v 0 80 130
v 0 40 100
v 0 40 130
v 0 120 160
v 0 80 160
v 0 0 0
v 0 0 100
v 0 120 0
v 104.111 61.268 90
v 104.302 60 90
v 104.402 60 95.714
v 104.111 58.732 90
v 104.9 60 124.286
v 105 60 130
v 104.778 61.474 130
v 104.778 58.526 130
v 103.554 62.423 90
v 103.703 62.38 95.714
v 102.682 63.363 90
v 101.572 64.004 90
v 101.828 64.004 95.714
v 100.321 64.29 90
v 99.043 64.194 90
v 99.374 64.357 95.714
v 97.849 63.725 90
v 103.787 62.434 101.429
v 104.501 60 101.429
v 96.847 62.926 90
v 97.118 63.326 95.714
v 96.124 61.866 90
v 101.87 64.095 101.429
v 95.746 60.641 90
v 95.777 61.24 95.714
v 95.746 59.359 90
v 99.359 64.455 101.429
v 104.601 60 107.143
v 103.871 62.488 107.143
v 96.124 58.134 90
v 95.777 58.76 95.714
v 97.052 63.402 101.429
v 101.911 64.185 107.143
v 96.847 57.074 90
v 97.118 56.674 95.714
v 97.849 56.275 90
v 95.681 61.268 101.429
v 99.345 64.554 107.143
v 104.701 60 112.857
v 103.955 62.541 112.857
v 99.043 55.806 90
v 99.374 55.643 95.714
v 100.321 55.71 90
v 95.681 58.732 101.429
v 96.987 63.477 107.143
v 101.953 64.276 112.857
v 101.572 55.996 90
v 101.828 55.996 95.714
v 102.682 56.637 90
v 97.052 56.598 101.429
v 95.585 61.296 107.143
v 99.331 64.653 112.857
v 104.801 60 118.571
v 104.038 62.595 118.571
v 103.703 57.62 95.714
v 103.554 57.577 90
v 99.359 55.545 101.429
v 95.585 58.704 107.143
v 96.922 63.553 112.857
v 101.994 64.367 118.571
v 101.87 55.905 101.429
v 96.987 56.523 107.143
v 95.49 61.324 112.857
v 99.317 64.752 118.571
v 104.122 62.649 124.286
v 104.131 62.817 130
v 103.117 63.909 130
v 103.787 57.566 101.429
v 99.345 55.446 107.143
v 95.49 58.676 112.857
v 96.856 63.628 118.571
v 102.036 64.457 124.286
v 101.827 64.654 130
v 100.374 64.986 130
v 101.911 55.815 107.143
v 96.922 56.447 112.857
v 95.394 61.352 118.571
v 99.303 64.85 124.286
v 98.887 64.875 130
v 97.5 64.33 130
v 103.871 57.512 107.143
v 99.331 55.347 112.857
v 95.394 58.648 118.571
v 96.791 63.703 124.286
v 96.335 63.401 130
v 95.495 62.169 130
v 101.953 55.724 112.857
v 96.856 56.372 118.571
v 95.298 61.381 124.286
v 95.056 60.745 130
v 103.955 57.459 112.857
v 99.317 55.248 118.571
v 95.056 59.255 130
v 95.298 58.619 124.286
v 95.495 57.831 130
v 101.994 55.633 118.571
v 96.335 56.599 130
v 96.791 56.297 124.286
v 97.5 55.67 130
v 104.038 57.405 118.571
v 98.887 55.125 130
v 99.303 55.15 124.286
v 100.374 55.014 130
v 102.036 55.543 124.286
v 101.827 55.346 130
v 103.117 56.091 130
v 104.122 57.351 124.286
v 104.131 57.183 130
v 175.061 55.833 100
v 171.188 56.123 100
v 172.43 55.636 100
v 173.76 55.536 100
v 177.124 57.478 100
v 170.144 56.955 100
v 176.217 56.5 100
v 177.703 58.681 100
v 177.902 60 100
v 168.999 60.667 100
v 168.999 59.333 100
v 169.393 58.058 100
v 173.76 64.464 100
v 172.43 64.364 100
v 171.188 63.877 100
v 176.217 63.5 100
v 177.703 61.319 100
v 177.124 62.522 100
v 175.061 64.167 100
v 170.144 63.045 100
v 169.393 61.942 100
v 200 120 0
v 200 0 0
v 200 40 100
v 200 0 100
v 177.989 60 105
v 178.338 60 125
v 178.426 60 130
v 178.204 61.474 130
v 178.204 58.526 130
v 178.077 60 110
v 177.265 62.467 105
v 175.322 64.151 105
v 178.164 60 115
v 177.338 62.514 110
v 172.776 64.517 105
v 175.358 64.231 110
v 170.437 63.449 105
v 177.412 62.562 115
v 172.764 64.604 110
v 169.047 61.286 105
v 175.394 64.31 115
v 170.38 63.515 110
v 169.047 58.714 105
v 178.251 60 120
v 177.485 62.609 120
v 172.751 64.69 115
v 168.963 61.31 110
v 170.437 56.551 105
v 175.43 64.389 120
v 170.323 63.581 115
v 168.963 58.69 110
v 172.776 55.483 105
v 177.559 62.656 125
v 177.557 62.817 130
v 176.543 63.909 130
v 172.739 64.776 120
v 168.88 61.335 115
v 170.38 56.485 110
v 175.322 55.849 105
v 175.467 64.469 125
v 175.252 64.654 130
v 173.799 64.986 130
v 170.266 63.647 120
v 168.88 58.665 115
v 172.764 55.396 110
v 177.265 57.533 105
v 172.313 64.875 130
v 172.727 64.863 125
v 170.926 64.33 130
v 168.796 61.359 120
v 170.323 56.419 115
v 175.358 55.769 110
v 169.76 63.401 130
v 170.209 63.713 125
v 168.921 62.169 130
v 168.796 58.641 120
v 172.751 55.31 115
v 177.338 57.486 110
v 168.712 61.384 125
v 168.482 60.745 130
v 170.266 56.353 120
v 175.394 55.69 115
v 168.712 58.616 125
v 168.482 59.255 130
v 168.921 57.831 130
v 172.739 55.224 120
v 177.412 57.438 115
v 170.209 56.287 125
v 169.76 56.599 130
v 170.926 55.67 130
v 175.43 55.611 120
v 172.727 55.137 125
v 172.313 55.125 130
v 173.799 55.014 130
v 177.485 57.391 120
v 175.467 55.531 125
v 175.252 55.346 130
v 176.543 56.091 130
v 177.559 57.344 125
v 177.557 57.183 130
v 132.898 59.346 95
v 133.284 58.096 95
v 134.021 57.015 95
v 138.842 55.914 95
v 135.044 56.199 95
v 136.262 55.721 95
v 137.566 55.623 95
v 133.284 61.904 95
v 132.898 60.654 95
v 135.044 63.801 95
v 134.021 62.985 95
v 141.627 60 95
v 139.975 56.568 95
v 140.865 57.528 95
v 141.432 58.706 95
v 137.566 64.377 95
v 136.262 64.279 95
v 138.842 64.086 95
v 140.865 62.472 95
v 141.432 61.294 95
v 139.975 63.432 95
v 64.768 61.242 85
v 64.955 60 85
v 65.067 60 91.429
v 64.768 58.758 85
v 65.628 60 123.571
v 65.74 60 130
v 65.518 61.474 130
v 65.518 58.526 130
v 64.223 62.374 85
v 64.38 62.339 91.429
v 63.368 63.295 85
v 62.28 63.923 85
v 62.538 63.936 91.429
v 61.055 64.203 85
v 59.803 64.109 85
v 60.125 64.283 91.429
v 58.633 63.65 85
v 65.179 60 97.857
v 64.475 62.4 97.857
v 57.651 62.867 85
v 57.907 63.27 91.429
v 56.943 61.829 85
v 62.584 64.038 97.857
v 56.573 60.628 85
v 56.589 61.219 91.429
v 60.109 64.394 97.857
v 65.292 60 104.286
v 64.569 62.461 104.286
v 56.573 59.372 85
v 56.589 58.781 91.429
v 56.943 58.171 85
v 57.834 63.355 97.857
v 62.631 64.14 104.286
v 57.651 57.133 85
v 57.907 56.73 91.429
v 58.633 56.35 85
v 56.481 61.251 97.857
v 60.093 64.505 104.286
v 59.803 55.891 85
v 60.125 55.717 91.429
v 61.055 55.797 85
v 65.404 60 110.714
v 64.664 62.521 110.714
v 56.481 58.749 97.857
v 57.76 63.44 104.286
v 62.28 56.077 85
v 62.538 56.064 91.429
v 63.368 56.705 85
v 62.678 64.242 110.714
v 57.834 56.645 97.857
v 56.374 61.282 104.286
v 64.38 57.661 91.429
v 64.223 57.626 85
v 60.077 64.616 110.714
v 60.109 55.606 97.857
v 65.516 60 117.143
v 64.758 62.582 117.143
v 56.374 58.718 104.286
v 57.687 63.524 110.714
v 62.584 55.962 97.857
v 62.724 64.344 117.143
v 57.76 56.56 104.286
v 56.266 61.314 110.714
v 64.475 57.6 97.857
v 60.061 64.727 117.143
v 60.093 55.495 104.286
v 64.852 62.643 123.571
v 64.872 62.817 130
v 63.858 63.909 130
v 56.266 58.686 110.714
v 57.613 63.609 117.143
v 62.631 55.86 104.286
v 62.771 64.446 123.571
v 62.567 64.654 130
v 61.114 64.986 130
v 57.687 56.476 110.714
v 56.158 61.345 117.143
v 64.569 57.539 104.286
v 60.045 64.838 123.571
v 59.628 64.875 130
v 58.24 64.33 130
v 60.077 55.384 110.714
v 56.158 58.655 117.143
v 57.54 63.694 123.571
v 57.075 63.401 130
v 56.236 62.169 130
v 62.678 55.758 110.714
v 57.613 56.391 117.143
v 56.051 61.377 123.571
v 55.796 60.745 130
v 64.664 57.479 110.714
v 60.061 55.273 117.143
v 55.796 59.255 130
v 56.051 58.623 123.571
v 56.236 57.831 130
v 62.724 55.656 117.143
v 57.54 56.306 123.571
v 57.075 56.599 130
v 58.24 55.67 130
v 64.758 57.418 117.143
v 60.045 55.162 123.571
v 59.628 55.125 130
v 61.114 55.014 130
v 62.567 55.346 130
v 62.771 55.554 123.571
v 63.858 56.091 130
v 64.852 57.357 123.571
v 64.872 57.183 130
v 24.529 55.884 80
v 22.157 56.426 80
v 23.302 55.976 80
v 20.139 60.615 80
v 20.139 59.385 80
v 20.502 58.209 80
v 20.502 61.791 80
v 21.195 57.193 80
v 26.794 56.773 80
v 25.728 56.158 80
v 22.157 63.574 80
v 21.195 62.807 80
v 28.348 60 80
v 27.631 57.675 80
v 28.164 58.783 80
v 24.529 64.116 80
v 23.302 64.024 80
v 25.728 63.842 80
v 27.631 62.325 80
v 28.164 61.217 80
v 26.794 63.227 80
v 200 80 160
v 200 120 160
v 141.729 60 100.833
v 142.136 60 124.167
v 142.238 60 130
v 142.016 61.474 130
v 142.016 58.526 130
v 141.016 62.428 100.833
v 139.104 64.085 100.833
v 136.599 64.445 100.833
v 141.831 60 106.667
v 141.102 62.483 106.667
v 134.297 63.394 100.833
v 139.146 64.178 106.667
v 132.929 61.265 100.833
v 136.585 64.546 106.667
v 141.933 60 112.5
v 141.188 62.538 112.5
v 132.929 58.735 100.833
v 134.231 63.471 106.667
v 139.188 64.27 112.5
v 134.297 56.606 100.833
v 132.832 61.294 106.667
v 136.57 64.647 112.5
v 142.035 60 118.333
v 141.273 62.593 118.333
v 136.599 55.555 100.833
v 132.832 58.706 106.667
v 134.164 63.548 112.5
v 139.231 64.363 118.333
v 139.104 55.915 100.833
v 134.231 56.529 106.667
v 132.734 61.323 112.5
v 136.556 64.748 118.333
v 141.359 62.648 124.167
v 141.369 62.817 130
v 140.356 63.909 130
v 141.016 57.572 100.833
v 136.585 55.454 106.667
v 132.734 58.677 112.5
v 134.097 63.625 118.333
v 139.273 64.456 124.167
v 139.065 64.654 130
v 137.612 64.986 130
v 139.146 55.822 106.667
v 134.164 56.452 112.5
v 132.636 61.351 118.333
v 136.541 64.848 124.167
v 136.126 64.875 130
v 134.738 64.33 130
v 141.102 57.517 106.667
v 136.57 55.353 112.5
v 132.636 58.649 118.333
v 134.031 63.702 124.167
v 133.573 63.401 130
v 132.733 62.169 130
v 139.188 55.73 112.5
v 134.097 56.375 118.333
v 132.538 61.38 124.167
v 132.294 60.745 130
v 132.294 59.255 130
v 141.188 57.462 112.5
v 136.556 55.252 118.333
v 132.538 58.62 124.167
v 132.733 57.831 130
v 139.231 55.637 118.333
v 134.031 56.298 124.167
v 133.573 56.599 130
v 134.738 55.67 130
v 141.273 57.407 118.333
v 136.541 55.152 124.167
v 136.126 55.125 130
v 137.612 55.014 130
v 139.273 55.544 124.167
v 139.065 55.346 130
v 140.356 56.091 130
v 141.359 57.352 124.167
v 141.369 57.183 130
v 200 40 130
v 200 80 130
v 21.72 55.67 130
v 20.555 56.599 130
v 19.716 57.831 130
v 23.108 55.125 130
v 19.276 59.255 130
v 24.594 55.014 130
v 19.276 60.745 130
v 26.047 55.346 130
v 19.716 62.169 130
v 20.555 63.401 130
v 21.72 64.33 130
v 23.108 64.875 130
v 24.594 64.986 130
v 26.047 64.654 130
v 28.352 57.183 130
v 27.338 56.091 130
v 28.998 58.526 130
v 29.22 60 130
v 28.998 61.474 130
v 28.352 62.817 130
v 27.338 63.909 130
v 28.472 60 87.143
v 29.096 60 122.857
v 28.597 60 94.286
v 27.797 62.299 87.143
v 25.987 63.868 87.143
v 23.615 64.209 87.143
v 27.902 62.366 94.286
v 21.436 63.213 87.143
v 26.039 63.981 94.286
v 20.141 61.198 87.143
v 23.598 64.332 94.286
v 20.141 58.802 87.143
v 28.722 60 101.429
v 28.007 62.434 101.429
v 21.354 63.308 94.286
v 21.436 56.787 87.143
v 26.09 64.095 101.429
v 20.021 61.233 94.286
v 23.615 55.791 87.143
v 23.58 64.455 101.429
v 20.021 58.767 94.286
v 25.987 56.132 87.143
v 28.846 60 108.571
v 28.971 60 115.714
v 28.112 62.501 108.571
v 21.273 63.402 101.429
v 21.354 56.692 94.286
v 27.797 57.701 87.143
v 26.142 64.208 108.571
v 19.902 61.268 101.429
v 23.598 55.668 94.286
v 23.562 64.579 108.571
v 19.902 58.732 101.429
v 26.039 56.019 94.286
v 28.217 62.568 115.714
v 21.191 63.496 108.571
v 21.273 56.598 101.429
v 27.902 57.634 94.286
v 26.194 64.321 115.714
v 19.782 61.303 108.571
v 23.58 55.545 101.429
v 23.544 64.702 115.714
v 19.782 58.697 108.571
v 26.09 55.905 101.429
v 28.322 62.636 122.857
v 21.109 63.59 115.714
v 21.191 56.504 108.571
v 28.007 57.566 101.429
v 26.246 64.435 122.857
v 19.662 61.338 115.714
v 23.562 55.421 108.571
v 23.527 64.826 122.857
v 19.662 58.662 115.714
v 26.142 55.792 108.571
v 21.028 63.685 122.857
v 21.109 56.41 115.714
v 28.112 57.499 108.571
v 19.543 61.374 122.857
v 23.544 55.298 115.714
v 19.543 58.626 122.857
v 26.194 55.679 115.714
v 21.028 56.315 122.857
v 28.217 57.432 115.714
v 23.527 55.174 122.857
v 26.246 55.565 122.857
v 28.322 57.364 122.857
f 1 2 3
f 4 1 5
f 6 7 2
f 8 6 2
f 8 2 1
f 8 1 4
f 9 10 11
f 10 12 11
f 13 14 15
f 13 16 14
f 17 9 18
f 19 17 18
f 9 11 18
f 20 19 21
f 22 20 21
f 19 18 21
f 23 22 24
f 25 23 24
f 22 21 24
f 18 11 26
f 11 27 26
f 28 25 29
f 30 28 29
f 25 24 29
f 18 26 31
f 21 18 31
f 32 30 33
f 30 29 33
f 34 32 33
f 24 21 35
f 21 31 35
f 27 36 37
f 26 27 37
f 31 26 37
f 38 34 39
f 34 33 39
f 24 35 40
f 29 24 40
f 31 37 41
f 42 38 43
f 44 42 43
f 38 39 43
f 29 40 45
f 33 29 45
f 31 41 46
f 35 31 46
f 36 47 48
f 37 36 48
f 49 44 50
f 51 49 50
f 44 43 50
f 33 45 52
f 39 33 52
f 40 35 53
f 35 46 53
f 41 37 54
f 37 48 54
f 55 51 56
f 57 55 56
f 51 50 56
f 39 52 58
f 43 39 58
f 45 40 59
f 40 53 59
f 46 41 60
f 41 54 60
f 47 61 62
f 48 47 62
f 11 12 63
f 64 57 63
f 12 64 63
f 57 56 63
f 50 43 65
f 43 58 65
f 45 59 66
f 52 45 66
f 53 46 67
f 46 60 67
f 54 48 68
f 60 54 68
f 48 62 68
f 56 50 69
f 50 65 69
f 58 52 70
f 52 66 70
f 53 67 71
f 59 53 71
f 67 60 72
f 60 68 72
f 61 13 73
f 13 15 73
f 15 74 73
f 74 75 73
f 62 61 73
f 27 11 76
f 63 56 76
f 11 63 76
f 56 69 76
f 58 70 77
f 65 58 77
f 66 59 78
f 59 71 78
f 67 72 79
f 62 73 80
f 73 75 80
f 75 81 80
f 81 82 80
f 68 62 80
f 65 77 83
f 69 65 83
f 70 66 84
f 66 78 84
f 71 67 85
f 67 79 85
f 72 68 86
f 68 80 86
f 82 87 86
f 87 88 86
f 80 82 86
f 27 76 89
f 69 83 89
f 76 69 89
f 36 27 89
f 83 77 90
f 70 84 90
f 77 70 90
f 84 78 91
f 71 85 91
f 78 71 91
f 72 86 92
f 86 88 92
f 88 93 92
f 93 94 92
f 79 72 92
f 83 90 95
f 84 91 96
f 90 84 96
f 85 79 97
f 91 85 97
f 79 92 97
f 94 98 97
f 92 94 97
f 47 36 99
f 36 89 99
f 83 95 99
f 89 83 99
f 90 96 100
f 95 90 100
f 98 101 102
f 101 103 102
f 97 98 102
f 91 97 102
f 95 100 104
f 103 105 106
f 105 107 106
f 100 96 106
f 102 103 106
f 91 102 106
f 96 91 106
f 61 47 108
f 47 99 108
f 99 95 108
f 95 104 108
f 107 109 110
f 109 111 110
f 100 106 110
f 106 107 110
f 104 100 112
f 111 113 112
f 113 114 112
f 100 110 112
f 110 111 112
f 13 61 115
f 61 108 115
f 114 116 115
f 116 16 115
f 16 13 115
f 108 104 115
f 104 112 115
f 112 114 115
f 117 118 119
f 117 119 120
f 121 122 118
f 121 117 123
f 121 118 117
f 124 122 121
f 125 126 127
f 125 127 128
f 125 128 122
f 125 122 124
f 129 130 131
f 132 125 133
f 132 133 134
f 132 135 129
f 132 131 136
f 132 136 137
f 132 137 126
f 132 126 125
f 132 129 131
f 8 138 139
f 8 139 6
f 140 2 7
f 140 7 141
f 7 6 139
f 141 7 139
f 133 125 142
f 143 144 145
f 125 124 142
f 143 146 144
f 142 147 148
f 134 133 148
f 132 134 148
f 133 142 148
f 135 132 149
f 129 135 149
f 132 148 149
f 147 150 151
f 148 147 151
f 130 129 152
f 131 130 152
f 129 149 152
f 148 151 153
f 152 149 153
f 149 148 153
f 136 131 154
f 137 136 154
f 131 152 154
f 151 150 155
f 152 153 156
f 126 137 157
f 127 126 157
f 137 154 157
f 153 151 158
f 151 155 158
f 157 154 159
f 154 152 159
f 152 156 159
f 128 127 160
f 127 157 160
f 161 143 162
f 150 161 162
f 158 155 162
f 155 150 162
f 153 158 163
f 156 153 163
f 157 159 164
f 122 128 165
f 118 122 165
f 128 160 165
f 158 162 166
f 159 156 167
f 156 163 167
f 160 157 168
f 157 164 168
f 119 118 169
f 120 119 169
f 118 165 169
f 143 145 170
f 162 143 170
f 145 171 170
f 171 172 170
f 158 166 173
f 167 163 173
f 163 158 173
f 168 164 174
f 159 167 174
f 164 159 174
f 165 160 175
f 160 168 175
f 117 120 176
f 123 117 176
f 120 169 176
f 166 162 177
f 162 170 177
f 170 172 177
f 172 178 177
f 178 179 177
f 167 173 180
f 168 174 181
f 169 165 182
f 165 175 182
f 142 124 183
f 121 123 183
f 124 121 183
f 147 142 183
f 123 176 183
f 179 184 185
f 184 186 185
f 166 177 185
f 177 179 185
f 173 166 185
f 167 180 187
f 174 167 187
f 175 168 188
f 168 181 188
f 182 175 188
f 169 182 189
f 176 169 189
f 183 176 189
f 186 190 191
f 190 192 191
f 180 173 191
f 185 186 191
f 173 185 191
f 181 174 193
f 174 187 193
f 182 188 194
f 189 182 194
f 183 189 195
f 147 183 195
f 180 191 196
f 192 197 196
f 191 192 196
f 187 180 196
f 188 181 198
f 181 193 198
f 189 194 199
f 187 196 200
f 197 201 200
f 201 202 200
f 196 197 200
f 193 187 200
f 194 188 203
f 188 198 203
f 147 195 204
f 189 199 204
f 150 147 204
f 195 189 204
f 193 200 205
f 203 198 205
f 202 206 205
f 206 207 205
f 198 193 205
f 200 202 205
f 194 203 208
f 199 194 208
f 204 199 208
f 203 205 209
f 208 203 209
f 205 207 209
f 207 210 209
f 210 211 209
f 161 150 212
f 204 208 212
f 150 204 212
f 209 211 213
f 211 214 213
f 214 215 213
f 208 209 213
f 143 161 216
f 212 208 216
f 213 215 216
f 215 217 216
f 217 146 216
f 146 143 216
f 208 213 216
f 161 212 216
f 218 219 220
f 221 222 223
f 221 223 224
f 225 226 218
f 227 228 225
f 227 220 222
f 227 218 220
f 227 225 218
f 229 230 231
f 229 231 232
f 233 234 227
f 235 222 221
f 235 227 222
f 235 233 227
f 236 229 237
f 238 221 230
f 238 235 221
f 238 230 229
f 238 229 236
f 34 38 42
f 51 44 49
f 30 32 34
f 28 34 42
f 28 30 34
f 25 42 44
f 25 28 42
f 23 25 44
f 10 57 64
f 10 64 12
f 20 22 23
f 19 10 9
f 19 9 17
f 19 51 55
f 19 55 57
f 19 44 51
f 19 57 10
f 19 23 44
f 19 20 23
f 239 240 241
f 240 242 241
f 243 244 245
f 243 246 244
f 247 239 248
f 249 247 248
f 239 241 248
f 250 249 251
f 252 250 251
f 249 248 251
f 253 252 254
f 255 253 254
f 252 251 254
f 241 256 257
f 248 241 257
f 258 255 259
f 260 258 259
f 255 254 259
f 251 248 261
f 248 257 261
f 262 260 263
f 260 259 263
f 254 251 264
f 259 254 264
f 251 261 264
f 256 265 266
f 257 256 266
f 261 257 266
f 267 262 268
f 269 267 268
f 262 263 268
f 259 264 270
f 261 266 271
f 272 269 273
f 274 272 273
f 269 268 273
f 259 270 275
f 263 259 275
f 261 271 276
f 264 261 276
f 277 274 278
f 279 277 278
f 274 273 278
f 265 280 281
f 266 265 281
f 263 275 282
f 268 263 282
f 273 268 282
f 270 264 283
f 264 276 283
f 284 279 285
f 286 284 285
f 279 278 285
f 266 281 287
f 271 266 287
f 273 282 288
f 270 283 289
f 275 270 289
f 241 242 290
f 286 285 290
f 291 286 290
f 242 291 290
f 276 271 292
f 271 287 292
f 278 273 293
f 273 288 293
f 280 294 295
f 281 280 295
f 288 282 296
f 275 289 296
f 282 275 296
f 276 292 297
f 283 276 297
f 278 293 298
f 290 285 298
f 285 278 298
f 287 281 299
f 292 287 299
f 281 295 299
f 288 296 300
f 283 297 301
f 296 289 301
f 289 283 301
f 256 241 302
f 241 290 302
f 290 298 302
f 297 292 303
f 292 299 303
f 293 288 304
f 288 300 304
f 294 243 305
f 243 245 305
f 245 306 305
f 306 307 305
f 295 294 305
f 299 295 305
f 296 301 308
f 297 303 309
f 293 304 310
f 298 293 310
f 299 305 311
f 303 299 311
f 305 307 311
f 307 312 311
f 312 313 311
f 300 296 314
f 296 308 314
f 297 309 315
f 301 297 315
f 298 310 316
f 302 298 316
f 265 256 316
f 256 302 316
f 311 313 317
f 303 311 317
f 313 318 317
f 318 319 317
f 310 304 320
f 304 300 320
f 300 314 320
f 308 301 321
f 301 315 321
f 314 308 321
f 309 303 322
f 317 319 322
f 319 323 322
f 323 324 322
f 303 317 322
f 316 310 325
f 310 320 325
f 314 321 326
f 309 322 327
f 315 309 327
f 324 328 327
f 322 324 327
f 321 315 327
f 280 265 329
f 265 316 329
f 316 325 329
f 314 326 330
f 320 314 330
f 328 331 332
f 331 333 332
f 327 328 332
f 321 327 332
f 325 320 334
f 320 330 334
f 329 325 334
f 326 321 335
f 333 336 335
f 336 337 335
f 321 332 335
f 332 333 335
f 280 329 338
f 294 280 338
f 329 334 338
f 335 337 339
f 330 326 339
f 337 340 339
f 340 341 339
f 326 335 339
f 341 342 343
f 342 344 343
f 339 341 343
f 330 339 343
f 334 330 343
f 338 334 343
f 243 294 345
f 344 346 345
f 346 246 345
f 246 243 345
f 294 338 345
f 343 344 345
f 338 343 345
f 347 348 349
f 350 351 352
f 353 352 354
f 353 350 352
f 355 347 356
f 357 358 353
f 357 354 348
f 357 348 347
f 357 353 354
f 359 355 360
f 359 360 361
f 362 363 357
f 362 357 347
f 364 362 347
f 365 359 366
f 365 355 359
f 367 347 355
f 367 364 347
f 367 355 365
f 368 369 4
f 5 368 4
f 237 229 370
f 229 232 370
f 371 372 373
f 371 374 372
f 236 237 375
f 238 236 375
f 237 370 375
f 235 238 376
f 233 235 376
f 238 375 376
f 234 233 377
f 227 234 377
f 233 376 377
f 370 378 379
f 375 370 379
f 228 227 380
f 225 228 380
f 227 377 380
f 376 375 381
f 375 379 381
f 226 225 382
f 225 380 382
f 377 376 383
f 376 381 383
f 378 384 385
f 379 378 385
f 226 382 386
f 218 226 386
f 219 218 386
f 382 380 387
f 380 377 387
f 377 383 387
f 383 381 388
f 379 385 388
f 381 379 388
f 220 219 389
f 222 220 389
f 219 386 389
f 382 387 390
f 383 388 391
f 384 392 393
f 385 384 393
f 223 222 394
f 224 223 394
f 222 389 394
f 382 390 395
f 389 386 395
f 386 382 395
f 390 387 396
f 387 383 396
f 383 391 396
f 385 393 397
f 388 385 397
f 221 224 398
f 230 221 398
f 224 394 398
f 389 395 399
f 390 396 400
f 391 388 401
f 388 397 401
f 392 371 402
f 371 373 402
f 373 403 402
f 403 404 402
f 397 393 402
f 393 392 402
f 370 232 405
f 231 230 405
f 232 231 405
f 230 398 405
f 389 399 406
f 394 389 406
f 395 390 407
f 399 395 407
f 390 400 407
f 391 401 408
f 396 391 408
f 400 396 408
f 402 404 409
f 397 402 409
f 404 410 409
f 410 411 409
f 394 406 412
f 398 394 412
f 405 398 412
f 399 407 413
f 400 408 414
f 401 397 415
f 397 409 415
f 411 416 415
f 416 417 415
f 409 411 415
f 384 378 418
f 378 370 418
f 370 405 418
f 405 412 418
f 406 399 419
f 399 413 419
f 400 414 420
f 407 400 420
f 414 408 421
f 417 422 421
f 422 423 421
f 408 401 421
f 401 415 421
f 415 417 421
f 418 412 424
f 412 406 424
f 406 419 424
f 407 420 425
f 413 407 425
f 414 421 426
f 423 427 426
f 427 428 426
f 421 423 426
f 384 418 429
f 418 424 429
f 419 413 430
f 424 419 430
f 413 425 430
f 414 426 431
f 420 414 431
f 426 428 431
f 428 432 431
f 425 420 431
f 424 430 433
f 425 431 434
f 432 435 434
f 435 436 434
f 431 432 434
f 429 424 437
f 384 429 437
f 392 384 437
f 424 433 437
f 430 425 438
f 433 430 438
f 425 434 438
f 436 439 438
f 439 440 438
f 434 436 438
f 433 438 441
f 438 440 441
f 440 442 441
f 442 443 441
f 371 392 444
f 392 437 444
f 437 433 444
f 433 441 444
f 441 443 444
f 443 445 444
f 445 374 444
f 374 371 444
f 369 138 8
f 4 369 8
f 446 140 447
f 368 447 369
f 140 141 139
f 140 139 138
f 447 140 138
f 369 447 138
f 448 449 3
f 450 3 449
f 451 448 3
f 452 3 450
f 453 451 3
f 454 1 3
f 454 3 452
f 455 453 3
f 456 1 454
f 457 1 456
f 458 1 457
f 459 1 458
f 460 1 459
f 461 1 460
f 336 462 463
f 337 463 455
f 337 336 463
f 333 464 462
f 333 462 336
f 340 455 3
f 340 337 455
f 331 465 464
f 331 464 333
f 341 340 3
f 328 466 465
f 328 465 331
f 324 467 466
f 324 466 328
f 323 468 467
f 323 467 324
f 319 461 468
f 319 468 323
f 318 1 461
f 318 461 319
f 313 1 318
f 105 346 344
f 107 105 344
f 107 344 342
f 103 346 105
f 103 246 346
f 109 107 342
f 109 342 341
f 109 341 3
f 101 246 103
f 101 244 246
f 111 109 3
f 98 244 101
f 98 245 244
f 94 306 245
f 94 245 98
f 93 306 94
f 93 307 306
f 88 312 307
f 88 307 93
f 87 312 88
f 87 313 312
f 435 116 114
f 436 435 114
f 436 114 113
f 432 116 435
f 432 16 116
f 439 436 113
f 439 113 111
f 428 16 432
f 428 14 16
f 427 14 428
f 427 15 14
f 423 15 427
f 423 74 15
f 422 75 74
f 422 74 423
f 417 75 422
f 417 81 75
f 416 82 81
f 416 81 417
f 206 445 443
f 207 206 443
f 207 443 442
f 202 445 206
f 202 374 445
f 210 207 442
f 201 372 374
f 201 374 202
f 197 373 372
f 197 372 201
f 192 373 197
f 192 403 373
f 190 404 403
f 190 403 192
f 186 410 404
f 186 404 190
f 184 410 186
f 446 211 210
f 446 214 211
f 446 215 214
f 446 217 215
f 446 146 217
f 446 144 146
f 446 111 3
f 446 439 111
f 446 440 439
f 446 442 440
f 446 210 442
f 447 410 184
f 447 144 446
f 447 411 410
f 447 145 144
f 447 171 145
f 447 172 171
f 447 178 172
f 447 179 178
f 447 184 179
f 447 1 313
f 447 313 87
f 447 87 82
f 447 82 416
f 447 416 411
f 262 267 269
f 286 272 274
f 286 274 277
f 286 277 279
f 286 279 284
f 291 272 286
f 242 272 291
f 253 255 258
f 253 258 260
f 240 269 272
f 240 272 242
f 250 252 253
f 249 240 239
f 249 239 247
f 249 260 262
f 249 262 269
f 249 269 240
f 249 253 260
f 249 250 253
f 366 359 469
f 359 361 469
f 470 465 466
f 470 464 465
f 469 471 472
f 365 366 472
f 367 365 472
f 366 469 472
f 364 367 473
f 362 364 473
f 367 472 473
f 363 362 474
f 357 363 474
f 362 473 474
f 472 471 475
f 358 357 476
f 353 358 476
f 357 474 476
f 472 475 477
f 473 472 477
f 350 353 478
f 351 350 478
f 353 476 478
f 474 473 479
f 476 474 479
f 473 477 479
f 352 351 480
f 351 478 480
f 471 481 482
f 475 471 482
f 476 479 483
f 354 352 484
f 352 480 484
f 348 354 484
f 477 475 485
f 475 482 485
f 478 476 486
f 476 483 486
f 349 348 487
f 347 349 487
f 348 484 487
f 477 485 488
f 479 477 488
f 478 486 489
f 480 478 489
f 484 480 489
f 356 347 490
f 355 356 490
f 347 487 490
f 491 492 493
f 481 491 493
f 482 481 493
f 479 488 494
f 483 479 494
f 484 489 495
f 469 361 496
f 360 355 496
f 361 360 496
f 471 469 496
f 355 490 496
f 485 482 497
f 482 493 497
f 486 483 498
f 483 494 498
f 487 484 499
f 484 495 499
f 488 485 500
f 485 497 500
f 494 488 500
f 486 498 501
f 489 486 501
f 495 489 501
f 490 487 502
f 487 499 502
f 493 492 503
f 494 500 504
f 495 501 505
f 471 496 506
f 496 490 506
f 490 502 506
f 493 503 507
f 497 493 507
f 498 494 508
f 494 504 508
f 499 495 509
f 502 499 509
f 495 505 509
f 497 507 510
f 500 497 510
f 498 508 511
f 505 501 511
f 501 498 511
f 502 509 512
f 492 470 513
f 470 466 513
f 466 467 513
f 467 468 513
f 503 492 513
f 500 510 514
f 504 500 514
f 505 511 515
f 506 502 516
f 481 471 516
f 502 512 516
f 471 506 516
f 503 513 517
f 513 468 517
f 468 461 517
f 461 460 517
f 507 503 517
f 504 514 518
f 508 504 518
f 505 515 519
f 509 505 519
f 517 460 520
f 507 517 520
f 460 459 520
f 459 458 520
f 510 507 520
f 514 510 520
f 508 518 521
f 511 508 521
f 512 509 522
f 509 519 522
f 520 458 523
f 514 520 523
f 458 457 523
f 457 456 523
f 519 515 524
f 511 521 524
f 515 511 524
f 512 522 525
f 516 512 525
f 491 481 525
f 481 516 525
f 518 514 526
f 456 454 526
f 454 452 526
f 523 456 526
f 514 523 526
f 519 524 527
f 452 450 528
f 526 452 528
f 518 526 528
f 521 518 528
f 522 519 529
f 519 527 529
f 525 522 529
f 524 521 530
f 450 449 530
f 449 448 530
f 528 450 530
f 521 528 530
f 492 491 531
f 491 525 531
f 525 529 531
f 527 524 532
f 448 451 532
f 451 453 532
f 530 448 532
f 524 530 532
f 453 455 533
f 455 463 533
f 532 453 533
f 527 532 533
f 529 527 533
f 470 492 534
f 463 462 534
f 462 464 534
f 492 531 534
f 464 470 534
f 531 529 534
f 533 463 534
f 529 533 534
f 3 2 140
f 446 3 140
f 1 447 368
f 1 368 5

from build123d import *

# Parameters (mm, degrees)
SKETCH_1_W           = 200
SKETCH_1_H           = 40
EXTRUDE_1_DEPTH      = 100
SKETCH_1_3_W         = 200
SKETCH_1_3_H         = 40
EXTRUDE_2_DEPTH      = 130
SKETCH_10_W          = 200
SKETCH_10_H          = 40
EXTRUDE_3_DEPTH      = 160
SKETCH_12_R          = 5
CUT_EXTRUDE_8_DEPTH  = 50
CUT_EXTRUDE_8_DRAFT  = -1
SKETCH_12_5_R        = 5
CUT_EXTRUDE_9_DEPTH  = 45
CUT_EXTRUDE_9_DRAFT  = -1
SKETCH_12_6_R        = 5
CUT_EXTRUDE_10_DEPTH = 40
CUT_EXTRUDE_10_DRAFT = -1
SKETCH_12_7_R        = 5
CUT_EXTRUDE_11_DEPTH = 35
CUT_EXTRUDE_11_DRAFT = -1
SKETCH_12_8_R        = 5
CUT_EXTRUDE_12_DEPTH = 30
CUT_EXTRUDE_12_DRAFT = -1


with BuildPart() as part:
    # Эскиз1 → Бобышка-Вытянуть1 (new body)
    with BuildSketch(Plane.XY):
        with Locations((100, 20)):
            Rectangle(SKETCH_1_W, SKETCH_1_H)
    extrude(amount=EXTRUDE_1_DEPTH)

    # Эскиз1<3> → Бобышка-Вытянуть2 (add)
    with BuildSketch(Plane.XY):
        with Locations((100, 60)):
            Rectangle(SKETCH_1_3_W, SKETCH_1_3_H)
    extrude(amount=EXTRUDE_2_DEPTH)

    # Эскиз10 → Бобышка-Вытянуть3 (add)
    with BuildSketch(Plane(origin=(0, 0, 0), x_dir=(-1, 0, 0), z_dir=(0, 0, -1))):
        with Locations((-100, 100)):
            Rectangle(SKETCH_10_W, SKETCH_10_H)
    extrude(amount=-EXTRUDE_3_DEPTH)


with BuildPart() as cut_extrude_8_tool:
    # Эскиз12 → Вырез-Вытянуть8 (with draft: the straight prism first)
    with BuildSketch(Plane.XY.offset(130)):
        with Locations((24.220497744, 60)):
            Circle(SKETCH_12_R)
    extrude(amount=-CUT_EXTRUDE_8_DEPTH)
    # Вырез-Вытянуть8: the draft: its side faces are tilted about the plane it starts from
    cut_extrude_8_sides = [cut_extrude_8_tool.faces().sort_by_distance(p)[0] for p in [
        (19.220497744, 60, 105),
    ]]
    draft(cut_extrude_8_sides, Plane.XY.offset(130), CUT_EXTRUDE_8_DRAFT)


with BuildPart() as part_1:
    add(part.part)

    # Вырез-Вытянуть8: cut by cut_extrude_8_tool
    add(cut_extrude_8_tool.part, mode=Mode.SUBTRACT)


with BuildPart() as cut_extrude_9_tool:
    # Эскиз12<5> → Вырез-Вытянуть9 (with draft: the straight prism first)
    with BuildSketch(Plane.XY.offset(130)):
        with Locations((60.740492413, 60)):
            Circle(SKETCH_12_5_R)
    extrude(amount=-CUT_EXTRUDE_9_DEPTH)
    # Вырез-Вытянуть9: the draft: its side faces are tilted about the plane it starts from
    cut_extrude_9_sides = [cut_extrude_9_tool.faces().sort_by_distance(p)[0] for p in [
        (55.740492413, 60, 107.5),
    ]]
    draft(cut_extrude_9_sides, Plane.XY.offset(130), CUT_EXTRUDE_9_DRAFT)


with BuildPart() as part_2:
    add(part_1.part)

    # Вырез-Вытянуть9: cut by cut_extrude_9_tool
    add(cut_extrude_9_tool.part, mode=Mode.SUBTRACT)


with BuildPart() as cut_extrude_10_tool:
    # Эскиз12<6> → Вырез-Вытянуть10 (with draft: the straight prism first)
    with BuildSketch(Plane.XY.offset(130)):
        with Locations((100, 60)):
            Circle(SKETCH_12_6_R)
    extrude(amount=-CUT_EXTRUDE_10_DEPTH)
    # Вырез-Вытянуть10: the draft: its side faces are tilted about the plane it starts from
    cut_extrude_10_sides = [cut_extrude_10_tool.faces().sort_by_distance(p)[0] for p in [
        (95, 60, 110),
    ]]
    draft(cut_extrude_10_sides, Plane.XY.offset(130), CUT_EXTRUDE_10_DRAFT)


with BuildPart() as part_3:
    add(part_2.part)

    # Вырез-Вытянуть10: cut by cut_extrude_10_tool
    add(cut_extrude_10_tool.part, mode=Mode.SUBTRACT)


with BuildPart() as cut_extrude_11_tool:
    # Эскиз12<7> → Вырез-Вытянуть11 (with draft: the straight prism first)
    with BuildSketch(Plane.XY.offset(130)):
        with Locations((137.238261218, 60)):
            Circle(SKETCH_12_7_R)
    extrude(amount=-CUT_EXTRUDE_11_DEPTH)
    # Вырез-Вытянуть11: the draft: its side faces are tilted about the plane it starts from
    cut_extrude_11_sides = [cut_extrude_11_tool.faces().sort_by_distance(p)[0] for p in [
        (132.238261218, 60, 112.5),
    ]]
    draft(cut_extrude_11_sides, Plane.XY.offset(130), CUT_EXTRUDE_11_DRAFT)


with BuildPart() as part_4:
    add(part_3.part)

    # Вырез-Вытянуть11: cut by cut_extrude_11_tool
    add(cut_extrude_11_tool.part, mode=Mode.SUBTRACT)


with BuildPart() as cut_extrude_12_tool:
    # Эскиз12<8> → Вырез-Вытянуть12 (with draft: the straight prism first)
    with BuildSketch(Plane.XY.offset(130)):
        with Locations((173.42575674, 60)):
            Circle(SKETCH_12_8_R)
    extrude(amount=-CUT_EXTRUDE_12_DEPTH)
    # Вырез-Вытянуть12: the draft: its side faces are tilted about the plane it starts from
    cut_extrude_12_sides = [cut_extrude_12_tool.faces().sort_by_distance(p)[0] for p in [
        (168.42575674, 60, 115),
    ]]
    draft(cut_extrude_12_sides, Plane.XY.offset(130), CUT_EXTRUDE_12_DRAFT)


with BuildPart() as part_5:
    add(part_4.part)

    # Вырез-Вытянуть12: cut by cut_extrude_12_tool
    add(cut_extrude_12_tool.part, mode=Mode.SUBTRACT)


solid = part_5.part
